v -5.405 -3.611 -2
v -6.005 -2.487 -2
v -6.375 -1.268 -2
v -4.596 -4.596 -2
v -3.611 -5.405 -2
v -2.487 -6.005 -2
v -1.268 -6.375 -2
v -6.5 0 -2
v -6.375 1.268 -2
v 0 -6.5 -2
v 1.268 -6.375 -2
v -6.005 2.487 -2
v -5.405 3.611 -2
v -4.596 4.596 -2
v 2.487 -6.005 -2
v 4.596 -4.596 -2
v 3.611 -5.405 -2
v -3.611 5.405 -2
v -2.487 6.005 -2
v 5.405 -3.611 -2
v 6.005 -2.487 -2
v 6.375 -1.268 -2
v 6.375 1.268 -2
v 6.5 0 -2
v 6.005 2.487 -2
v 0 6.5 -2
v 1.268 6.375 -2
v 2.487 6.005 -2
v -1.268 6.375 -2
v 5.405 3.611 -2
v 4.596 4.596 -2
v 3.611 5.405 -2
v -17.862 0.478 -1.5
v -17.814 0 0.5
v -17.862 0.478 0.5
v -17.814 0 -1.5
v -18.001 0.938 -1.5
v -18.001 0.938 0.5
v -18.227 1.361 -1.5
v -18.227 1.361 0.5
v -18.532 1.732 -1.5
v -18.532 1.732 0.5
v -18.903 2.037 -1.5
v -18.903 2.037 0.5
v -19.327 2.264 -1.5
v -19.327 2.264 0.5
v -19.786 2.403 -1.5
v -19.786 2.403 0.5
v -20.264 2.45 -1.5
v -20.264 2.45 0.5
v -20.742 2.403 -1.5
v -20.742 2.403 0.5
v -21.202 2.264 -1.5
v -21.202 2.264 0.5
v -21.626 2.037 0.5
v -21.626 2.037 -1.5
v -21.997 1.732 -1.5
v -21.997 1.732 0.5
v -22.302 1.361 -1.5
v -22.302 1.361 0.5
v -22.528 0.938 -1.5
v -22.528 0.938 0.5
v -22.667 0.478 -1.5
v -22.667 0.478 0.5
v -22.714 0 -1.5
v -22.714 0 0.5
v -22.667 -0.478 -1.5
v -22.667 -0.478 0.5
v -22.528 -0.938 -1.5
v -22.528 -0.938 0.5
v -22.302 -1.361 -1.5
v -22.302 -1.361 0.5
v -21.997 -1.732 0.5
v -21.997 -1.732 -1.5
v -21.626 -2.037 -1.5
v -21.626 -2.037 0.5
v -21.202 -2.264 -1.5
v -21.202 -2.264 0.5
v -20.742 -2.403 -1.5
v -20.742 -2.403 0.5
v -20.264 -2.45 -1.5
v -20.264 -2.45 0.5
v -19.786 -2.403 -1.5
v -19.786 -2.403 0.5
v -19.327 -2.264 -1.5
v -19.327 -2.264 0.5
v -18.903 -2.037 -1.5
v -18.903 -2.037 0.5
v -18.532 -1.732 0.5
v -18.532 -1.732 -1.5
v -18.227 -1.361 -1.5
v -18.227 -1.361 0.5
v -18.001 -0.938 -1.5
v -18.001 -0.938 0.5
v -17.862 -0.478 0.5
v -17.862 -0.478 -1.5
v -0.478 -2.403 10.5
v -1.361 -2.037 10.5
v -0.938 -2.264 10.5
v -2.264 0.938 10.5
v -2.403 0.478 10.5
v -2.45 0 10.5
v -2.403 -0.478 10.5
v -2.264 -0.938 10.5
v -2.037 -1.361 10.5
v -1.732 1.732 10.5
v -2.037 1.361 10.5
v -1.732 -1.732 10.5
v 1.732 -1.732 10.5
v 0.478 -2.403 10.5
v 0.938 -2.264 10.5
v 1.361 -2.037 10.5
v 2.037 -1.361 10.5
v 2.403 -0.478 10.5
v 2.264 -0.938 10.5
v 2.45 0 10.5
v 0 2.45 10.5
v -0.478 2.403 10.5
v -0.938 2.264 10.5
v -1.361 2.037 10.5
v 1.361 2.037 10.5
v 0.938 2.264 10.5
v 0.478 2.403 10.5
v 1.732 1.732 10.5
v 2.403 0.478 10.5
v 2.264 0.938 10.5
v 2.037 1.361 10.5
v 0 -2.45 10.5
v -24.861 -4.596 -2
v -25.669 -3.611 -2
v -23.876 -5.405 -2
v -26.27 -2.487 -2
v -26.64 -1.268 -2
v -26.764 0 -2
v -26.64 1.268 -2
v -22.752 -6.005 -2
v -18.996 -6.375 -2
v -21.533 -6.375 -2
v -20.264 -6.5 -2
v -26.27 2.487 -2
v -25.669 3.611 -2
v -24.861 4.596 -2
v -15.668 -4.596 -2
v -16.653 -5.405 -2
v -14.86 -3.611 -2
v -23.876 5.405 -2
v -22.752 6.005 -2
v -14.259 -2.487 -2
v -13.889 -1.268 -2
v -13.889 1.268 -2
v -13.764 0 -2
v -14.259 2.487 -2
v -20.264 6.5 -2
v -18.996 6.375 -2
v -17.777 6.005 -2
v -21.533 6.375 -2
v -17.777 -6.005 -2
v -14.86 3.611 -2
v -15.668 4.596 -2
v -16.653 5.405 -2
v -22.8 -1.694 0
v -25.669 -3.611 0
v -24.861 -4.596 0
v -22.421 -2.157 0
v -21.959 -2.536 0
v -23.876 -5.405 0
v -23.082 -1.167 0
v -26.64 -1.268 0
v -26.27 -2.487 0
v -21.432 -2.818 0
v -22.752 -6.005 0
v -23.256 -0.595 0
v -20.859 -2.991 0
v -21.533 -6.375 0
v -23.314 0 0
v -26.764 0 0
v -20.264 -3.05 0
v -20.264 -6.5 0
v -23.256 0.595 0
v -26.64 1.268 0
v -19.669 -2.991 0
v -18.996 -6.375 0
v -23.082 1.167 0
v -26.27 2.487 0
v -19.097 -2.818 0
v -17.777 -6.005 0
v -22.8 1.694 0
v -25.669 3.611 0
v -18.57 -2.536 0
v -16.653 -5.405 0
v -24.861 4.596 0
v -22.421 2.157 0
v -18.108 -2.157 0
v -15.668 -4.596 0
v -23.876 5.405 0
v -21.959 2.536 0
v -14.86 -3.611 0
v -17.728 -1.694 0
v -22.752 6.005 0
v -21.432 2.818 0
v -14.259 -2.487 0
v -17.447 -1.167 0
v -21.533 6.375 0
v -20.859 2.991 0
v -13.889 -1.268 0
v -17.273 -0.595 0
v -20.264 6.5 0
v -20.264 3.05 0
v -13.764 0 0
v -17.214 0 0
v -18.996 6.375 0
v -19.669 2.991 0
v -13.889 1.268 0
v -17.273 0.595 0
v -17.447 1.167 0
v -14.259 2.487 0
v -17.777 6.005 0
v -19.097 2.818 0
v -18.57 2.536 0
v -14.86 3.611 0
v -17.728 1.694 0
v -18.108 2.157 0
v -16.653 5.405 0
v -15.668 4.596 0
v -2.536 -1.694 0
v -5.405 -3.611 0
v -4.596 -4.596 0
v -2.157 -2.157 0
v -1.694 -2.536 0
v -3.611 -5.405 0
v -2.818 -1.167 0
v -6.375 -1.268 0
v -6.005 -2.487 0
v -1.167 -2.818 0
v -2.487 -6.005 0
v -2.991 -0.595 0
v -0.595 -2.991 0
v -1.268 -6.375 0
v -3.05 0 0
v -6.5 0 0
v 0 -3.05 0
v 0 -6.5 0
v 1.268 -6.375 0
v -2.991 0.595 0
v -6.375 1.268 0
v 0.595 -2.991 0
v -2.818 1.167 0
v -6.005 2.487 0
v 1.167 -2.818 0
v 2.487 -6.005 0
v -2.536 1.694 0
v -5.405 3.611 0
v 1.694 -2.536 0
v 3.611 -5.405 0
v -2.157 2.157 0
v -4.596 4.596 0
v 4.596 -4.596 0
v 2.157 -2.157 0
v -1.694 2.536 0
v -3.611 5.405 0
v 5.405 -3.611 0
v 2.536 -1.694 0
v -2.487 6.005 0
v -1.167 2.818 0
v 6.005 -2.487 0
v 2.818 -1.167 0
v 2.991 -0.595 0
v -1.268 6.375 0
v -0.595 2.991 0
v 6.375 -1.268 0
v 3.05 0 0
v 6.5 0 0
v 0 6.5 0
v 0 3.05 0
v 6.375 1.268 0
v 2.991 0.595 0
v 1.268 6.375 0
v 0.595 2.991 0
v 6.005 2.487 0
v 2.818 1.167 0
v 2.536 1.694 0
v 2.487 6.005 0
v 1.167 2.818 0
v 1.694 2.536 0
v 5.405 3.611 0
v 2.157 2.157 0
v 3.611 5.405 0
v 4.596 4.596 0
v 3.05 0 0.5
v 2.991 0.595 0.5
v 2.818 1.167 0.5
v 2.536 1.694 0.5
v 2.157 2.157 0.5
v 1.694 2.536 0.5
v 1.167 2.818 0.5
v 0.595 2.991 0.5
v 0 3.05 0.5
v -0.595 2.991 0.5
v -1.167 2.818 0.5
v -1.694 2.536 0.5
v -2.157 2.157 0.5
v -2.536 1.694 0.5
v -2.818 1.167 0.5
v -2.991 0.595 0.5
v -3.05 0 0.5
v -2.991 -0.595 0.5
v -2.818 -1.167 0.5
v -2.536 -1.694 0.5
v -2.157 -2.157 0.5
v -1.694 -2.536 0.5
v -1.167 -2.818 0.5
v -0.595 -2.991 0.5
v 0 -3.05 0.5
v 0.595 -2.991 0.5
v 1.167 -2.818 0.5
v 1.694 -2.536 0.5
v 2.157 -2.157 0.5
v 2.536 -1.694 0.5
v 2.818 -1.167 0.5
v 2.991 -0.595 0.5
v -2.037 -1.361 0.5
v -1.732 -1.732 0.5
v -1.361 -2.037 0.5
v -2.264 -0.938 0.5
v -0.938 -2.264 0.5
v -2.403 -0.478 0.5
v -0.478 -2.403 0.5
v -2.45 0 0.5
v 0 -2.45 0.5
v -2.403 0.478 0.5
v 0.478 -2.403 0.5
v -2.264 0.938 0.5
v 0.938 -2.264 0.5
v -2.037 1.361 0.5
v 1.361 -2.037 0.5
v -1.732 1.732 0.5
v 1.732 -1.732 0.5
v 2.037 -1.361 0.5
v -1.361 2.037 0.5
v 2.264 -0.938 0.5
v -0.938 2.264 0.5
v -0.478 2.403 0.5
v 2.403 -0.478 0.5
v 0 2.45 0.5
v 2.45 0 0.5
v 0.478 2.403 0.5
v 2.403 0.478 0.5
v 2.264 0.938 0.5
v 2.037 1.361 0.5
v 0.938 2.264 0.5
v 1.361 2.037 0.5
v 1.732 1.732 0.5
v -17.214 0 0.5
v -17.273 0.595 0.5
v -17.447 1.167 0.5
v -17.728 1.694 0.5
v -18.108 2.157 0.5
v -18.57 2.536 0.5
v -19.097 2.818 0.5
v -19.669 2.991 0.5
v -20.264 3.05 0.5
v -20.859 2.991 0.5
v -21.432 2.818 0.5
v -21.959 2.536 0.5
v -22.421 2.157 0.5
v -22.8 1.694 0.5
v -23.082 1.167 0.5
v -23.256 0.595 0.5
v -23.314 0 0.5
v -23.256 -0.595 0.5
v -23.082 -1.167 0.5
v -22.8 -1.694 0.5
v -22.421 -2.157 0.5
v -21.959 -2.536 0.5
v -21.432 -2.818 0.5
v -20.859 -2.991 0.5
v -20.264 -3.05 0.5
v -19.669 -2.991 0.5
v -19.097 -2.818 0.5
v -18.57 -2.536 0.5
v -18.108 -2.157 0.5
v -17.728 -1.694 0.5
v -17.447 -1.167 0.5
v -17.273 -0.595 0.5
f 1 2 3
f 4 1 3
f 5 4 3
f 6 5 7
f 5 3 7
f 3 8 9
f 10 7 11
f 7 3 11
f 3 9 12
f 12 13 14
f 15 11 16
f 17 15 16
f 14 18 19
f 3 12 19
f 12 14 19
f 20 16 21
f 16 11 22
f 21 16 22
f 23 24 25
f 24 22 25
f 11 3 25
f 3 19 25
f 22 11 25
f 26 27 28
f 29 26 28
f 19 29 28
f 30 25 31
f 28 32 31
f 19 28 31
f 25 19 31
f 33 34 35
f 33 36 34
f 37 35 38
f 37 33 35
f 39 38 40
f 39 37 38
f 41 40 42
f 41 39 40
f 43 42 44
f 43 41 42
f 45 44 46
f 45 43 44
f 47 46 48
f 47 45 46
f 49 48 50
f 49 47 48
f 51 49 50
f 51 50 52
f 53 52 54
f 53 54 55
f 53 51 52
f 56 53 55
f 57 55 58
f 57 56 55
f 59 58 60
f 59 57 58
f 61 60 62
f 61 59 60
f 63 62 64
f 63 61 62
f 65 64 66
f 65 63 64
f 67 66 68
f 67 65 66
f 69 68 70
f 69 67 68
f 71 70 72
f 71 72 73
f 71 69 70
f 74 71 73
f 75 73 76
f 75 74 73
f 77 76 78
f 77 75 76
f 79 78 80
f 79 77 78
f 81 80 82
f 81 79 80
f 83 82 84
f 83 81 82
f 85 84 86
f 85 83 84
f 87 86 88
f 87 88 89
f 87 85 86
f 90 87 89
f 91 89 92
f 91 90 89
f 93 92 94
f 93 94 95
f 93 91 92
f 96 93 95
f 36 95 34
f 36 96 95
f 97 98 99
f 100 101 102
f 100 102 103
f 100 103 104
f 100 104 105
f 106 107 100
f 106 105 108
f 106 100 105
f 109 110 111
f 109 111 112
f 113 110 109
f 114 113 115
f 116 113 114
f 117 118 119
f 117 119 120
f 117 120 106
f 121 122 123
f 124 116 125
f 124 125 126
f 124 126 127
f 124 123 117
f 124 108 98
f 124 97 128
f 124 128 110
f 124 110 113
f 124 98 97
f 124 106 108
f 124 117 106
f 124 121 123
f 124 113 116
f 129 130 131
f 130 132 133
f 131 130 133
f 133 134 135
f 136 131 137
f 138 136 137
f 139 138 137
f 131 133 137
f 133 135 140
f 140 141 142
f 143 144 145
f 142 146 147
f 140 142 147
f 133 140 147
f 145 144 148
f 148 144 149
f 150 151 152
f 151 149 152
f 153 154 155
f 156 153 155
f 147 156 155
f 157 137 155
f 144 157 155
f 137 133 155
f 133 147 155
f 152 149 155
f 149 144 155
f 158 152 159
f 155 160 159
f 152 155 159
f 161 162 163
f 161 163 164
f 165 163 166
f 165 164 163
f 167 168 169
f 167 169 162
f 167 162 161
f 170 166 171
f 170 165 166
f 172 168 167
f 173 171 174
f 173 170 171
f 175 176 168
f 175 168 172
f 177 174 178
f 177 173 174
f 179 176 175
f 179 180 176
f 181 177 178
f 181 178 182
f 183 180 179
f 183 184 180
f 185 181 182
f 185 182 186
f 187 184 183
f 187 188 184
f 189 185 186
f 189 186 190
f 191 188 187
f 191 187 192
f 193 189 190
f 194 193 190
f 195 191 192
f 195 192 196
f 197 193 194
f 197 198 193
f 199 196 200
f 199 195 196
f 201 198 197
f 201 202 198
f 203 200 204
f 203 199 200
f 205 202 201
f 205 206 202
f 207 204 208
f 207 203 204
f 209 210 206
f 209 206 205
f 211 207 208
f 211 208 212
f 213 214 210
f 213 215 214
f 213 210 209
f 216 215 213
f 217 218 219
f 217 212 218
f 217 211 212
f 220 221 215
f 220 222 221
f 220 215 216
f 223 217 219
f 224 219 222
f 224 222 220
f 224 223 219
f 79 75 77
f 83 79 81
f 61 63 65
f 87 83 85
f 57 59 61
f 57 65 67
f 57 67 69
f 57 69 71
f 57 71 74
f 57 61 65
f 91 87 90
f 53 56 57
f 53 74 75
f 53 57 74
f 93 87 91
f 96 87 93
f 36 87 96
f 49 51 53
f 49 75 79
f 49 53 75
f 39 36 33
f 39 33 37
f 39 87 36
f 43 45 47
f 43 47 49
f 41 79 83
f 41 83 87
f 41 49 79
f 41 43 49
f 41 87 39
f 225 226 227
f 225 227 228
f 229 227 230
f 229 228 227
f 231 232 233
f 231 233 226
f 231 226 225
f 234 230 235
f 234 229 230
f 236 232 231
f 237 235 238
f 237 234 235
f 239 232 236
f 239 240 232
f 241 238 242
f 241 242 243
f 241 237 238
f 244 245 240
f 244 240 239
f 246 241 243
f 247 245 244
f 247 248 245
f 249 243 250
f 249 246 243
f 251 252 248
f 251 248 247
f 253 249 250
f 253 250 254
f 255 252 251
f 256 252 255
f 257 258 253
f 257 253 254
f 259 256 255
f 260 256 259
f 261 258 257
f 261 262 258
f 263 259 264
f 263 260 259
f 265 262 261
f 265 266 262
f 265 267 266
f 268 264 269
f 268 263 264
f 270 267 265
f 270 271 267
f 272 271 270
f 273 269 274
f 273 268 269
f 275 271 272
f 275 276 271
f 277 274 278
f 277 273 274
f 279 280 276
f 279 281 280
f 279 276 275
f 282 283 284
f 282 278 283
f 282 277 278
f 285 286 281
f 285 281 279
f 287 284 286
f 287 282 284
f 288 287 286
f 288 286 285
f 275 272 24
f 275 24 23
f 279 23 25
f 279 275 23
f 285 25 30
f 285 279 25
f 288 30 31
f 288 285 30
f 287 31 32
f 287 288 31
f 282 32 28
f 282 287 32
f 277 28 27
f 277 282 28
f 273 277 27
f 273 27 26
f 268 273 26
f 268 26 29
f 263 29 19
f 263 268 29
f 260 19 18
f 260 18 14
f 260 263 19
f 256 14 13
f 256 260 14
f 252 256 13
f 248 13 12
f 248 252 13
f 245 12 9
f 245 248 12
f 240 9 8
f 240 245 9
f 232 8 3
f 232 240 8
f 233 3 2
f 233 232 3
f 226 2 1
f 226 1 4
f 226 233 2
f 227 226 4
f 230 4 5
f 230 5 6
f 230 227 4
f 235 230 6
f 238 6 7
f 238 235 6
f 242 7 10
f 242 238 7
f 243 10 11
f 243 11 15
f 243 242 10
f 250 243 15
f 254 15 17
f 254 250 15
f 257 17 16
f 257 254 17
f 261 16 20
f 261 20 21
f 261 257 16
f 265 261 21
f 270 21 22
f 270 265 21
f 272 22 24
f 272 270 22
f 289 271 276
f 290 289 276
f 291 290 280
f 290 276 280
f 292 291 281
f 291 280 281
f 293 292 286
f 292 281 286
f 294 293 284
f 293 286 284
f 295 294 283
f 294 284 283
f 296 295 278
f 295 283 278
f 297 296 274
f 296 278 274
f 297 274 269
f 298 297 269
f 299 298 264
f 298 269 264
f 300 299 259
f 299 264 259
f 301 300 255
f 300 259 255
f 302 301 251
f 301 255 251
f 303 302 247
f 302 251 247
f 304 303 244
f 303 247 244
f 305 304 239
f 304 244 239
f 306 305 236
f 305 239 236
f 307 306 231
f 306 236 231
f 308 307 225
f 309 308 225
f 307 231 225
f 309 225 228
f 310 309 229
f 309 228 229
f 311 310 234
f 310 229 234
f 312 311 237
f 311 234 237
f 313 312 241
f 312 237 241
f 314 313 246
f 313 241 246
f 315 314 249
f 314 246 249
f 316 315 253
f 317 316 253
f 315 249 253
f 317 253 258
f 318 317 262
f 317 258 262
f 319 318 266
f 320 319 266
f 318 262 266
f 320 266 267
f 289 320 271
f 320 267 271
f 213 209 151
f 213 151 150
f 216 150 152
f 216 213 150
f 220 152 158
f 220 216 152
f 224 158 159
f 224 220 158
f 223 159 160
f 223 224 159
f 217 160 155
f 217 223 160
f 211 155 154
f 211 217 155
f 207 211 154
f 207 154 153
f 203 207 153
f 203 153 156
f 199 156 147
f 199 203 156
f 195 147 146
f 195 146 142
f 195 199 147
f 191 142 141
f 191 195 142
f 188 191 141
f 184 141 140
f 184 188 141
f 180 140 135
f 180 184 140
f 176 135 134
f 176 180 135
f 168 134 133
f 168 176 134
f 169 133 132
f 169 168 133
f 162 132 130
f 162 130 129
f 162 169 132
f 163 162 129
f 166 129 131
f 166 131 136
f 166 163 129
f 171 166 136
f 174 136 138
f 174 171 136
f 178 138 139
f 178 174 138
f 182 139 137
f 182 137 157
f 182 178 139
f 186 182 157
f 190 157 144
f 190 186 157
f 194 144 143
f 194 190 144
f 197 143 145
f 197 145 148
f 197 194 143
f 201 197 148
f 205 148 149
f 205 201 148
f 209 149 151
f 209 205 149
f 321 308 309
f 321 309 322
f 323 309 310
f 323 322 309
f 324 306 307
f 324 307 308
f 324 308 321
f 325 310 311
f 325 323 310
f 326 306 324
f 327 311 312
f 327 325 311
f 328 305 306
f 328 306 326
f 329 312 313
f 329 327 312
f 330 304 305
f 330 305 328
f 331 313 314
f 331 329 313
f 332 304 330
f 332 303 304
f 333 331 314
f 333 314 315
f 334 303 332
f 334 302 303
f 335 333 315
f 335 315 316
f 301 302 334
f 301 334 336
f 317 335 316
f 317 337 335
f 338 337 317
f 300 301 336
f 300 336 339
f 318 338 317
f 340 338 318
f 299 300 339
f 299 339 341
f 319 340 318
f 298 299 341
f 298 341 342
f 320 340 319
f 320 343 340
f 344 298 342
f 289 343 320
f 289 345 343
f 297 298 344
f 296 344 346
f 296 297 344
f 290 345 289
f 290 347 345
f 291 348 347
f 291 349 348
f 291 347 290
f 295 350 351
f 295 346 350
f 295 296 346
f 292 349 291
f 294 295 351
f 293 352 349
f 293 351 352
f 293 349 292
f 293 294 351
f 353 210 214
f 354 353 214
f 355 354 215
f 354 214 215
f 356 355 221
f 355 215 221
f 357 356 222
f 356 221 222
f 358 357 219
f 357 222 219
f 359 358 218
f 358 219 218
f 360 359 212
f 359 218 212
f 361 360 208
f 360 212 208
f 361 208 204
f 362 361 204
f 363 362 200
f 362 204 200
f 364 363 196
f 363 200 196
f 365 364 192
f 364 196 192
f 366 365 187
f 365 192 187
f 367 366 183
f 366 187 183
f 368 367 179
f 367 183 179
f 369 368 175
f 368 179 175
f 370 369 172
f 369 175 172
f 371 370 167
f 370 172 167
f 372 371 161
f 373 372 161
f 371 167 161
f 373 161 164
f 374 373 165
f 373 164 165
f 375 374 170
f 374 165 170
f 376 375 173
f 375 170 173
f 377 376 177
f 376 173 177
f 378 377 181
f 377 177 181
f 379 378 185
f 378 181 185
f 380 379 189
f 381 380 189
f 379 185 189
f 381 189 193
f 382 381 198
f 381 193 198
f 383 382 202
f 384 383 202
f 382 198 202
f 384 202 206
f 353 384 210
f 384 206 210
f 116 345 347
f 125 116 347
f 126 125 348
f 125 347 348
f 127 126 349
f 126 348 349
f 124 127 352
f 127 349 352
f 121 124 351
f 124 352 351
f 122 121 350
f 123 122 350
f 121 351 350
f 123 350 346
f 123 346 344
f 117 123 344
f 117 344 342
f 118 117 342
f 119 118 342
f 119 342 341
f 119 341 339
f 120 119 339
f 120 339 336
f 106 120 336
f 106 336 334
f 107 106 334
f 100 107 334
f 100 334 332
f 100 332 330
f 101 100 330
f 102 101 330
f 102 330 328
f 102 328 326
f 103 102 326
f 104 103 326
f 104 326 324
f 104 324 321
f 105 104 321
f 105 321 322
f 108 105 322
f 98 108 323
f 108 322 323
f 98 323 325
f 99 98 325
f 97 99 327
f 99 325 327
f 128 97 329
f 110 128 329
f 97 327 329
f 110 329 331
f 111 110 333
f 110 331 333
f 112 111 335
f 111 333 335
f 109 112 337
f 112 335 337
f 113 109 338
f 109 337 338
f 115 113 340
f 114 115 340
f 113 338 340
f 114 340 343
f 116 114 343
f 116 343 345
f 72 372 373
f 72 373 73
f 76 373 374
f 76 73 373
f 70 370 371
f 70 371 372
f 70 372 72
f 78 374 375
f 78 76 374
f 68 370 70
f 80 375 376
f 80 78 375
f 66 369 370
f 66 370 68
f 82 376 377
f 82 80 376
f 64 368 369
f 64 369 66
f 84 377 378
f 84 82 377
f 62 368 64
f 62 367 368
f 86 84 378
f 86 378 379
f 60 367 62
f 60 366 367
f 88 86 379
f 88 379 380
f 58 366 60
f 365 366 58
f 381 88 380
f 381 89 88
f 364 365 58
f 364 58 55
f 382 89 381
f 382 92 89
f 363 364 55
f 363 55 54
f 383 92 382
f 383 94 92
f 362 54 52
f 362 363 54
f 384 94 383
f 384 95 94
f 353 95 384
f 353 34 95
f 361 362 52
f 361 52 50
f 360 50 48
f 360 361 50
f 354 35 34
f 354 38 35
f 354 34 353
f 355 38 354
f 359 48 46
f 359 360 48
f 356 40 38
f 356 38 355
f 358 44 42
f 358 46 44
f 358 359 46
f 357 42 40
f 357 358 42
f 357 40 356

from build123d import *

# Parameters (mm, degrees)
F0_R     = 2.45
F1_DEPTH = 10.5
F0_R_2   = 6.5
F0_R_3   = 3.05
F2_DEPTH = 2
F3_DEPTH = 0.5
F4_R     = 6.5
F4_R_2   = 3.05
F4_R_3   = 2.45
F5_DEPTH = 2
F6_DEPTH = 0.5
F7_DEPTH = 1.5


with BuildPart() as f1:
    # F0 (on Top) → F1 (new body)
    with BuildSketch(Plane.XY):
        Circle(F0_R)
    extrude(amount=F1_DEPTH)

    # F0 (on Top) → F2 (join)
    with BuildSketch(Plane.XY):
        Circle(F0_R_2)
        Circle(F0_R_3, mode=Mode.SUBTRACT)
        Circle(F0_R_3)
        Circle(F0_R, mode=Mode.SUBTRACT)
        Circle(F0_R)
    extrude(amount=-F2_DEPTH)

    # F0 (on Top) → F3 (join)
    with BuildSketch(Plane.XY):
        Circle(F0_R_3)
        Circle(F0_R, mode=Mode.SUBTRACT)
    extrude(amount=F3_DEPTH)


with BuildPart() as f5:
    # F4 (on Top) → F5 (new body)
    with BuildSketch(Plane.XY):
        with Locations((-20.2644243836, 0)):
            Circle(F4_R)
        with Locations((-20.2644243836, 0)):
            Circle(F4_R_2, mode=Mode.SUBTRACT)
        with Locations((-20.2644243836, 0)):
            Circle(F4_R_2)
        with Locations((-20.2644243836, 0)):
            Circle(F4_R_3, mode=Mode.SUBTRACT)
        with Locations((-20.2644243836, 0)):
            Circle(F4_R_3)
    extrude(amount=-F5_DEPTH)

    # F4 (on Top) → F6 (join)
    with BuildSketch(Plane.XY):
        with Locations((-20.2644243836, 0)):
            Circle(F4_R_2)
        with Locations((-20.2644243836, 0)):
            Circle(F4_R_3, mode=Mode.SUBTRACT)
    extrude(amount=F6_DEPTH)

    # F4 (on Top) → F7 (cut)
    with BuildSketch(Plane.XY):
        with Locations((-20.2644243836, 0)):
            Circle(F4_R_3)
    extrude(amount=-F7_DEPTH, mode=Mode.SUBTRACT)


solid = Compound([f1.part, f5.part])
